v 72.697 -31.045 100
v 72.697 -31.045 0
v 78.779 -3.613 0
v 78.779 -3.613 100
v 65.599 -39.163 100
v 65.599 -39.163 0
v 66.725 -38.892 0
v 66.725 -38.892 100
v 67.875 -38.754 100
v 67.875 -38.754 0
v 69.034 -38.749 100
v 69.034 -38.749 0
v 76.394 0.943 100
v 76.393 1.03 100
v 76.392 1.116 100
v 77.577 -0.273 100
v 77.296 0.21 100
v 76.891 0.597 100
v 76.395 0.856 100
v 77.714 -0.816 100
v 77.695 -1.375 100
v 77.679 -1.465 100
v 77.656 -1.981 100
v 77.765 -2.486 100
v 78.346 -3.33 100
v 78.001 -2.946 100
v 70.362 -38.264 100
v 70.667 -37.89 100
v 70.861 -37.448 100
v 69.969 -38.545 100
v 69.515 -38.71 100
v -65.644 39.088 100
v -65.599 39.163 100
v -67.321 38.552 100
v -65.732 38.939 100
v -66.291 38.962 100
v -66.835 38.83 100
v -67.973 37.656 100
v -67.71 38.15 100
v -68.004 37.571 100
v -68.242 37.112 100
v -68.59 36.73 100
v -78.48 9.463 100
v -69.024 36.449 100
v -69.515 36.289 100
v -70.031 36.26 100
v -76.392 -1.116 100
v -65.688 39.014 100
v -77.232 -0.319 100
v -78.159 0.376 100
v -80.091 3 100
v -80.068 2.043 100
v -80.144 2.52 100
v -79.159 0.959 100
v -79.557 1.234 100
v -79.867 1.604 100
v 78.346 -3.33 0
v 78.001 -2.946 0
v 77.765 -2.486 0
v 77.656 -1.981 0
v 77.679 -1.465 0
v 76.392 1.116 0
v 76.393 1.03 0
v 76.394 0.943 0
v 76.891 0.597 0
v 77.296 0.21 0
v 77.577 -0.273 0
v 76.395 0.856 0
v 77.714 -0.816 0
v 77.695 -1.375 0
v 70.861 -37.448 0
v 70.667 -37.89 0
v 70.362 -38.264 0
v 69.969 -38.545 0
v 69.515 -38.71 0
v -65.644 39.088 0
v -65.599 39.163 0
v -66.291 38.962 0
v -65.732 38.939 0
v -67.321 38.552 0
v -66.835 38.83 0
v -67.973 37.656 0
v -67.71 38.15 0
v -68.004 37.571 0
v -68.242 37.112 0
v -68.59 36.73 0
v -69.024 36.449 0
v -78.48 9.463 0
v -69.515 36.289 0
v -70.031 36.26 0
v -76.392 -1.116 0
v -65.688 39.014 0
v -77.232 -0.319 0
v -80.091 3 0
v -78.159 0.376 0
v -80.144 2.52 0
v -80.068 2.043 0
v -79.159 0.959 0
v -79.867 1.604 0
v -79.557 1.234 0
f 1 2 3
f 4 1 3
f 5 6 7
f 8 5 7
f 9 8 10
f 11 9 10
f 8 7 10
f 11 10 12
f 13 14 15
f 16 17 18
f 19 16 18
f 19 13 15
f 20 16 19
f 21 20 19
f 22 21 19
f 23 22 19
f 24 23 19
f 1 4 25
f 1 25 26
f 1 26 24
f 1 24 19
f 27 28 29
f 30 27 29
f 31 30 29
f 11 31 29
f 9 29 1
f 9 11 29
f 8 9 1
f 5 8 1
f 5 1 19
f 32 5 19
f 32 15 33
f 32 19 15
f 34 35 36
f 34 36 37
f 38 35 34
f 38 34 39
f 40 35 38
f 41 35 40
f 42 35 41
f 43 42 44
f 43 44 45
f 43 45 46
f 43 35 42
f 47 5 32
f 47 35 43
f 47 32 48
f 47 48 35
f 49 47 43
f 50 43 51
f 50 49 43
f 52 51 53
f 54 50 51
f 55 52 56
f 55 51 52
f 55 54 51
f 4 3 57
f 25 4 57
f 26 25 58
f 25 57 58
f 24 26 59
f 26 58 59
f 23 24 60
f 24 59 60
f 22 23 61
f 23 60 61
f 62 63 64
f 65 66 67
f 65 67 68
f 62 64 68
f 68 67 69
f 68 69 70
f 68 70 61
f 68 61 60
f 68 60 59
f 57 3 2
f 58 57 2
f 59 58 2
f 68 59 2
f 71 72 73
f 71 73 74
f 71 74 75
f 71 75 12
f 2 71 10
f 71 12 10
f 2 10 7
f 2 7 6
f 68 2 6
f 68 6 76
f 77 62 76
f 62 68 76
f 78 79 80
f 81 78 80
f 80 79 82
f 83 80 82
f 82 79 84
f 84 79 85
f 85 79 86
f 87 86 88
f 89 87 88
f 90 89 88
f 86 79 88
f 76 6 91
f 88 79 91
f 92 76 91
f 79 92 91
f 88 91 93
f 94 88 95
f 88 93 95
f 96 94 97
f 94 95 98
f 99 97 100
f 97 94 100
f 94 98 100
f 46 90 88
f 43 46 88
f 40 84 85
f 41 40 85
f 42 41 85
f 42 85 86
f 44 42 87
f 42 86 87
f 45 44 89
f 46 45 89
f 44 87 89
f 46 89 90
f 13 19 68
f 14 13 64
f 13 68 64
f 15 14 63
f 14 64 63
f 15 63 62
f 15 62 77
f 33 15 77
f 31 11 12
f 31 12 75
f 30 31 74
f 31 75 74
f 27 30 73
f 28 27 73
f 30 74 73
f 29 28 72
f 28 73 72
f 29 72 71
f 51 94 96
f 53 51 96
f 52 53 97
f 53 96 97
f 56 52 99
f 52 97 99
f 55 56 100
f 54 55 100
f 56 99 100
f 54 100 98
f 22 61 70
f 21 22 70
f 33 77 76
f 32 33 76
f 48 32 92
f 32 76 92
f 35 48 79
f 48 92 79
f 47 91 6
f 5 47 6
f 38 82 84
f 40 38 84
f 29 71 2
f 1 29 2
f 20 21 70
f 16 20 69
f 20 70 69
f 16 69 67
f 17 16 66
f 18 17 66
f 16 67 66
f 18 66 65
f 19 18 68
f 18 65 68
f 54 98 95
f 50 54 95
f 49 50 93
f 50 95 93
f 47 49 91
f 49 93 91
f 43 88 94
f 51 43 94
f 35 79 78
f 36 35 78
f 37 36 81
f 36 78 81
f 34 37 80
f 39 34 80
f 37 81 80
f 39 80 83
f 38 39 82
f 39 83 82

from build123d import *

# Parameters (mm, degrees)
BOSS_EXTRUDE1_DEPTH = 100


with BuildPart() as part:
    # Sketch1 → Boss-Extrude1 (new body)
    with BuildSketch(Plane(origin=(0, 0, 0), x_dir=(-1, 0, 0), z_dir=(0, 0, 1))):
        with BuildLine():
            Line((67.973290008, -37.656184374), (68.004301332, -37.570981461))
            ThreePointArc((68.004301332, -37.570981461), (68.797575177, -36.575628395), (70.030727156, -36.260434305))
            Line((70.030727156, -36.260434305), (78.47997961, -9.462829137))
            Line((78.47997961, -9.462829137), (80.091350343, -2.999974125))
            ThreePointArc((80.091350343, -2.999974125), (79.982164163, -1.81678638), (79.159491845, -0.959426994))
            ThreePointArc((79.159491845, -0.959426994), (77.685261787, -0.04212625), (76.391925323, 1.116353663))
            Line((76.391925323, 1.116353663), (-65.599171142, 39.162753293))
            ThreePointArc((-65.599171142, 39.162753293), (-67.298473332, 38.806148491), (-69.033844385, 38.748857773))
            ThreePointArc((-69.033844385, 38.748857773), (-70.174979205, 38.417698923), (-70.861131083, 37.447621369))
            Line((-70.861131083, 37.447621369), (-72.6970706, 31.044939381))
            Line((-72.6970706, 31.044939381), (-78.778605915, 3.612906317))
            ThreePointArc((-78.778605915, 3.612906317), (-77.86826202, 2.723364239), (-77.678943251, 1.464726275))
            Line((-77.678943251, 1.464726275), (-77.694688113, 1.375432727))
            ThreePointArc((-77.694688113, 1.375432727), (-77.453437445, 0.021779086), (-76.395283749, -0.8562248))
            ThreePointArc((-76.395283749, -0.8562248), (-76.393715257, -0.986290661), (-76.391925323, -1.116353663))
            Line((-76.391925323, -1.116353663), (65.599171142, -39.162753293))
            ThreePointArc((65.599171142, -39.162753293), (65.665752771, -39.051010396), (65.732144056, -38.939154303))
            ThreePointArc((65.732144056, -38.939154303), (67.08753398, -38.707857481), (67.973290008, -37.656184374))
        make_face()
    extrude(amount=BOSS_EXTRUDE1_DEPTH)


solid = part.part
